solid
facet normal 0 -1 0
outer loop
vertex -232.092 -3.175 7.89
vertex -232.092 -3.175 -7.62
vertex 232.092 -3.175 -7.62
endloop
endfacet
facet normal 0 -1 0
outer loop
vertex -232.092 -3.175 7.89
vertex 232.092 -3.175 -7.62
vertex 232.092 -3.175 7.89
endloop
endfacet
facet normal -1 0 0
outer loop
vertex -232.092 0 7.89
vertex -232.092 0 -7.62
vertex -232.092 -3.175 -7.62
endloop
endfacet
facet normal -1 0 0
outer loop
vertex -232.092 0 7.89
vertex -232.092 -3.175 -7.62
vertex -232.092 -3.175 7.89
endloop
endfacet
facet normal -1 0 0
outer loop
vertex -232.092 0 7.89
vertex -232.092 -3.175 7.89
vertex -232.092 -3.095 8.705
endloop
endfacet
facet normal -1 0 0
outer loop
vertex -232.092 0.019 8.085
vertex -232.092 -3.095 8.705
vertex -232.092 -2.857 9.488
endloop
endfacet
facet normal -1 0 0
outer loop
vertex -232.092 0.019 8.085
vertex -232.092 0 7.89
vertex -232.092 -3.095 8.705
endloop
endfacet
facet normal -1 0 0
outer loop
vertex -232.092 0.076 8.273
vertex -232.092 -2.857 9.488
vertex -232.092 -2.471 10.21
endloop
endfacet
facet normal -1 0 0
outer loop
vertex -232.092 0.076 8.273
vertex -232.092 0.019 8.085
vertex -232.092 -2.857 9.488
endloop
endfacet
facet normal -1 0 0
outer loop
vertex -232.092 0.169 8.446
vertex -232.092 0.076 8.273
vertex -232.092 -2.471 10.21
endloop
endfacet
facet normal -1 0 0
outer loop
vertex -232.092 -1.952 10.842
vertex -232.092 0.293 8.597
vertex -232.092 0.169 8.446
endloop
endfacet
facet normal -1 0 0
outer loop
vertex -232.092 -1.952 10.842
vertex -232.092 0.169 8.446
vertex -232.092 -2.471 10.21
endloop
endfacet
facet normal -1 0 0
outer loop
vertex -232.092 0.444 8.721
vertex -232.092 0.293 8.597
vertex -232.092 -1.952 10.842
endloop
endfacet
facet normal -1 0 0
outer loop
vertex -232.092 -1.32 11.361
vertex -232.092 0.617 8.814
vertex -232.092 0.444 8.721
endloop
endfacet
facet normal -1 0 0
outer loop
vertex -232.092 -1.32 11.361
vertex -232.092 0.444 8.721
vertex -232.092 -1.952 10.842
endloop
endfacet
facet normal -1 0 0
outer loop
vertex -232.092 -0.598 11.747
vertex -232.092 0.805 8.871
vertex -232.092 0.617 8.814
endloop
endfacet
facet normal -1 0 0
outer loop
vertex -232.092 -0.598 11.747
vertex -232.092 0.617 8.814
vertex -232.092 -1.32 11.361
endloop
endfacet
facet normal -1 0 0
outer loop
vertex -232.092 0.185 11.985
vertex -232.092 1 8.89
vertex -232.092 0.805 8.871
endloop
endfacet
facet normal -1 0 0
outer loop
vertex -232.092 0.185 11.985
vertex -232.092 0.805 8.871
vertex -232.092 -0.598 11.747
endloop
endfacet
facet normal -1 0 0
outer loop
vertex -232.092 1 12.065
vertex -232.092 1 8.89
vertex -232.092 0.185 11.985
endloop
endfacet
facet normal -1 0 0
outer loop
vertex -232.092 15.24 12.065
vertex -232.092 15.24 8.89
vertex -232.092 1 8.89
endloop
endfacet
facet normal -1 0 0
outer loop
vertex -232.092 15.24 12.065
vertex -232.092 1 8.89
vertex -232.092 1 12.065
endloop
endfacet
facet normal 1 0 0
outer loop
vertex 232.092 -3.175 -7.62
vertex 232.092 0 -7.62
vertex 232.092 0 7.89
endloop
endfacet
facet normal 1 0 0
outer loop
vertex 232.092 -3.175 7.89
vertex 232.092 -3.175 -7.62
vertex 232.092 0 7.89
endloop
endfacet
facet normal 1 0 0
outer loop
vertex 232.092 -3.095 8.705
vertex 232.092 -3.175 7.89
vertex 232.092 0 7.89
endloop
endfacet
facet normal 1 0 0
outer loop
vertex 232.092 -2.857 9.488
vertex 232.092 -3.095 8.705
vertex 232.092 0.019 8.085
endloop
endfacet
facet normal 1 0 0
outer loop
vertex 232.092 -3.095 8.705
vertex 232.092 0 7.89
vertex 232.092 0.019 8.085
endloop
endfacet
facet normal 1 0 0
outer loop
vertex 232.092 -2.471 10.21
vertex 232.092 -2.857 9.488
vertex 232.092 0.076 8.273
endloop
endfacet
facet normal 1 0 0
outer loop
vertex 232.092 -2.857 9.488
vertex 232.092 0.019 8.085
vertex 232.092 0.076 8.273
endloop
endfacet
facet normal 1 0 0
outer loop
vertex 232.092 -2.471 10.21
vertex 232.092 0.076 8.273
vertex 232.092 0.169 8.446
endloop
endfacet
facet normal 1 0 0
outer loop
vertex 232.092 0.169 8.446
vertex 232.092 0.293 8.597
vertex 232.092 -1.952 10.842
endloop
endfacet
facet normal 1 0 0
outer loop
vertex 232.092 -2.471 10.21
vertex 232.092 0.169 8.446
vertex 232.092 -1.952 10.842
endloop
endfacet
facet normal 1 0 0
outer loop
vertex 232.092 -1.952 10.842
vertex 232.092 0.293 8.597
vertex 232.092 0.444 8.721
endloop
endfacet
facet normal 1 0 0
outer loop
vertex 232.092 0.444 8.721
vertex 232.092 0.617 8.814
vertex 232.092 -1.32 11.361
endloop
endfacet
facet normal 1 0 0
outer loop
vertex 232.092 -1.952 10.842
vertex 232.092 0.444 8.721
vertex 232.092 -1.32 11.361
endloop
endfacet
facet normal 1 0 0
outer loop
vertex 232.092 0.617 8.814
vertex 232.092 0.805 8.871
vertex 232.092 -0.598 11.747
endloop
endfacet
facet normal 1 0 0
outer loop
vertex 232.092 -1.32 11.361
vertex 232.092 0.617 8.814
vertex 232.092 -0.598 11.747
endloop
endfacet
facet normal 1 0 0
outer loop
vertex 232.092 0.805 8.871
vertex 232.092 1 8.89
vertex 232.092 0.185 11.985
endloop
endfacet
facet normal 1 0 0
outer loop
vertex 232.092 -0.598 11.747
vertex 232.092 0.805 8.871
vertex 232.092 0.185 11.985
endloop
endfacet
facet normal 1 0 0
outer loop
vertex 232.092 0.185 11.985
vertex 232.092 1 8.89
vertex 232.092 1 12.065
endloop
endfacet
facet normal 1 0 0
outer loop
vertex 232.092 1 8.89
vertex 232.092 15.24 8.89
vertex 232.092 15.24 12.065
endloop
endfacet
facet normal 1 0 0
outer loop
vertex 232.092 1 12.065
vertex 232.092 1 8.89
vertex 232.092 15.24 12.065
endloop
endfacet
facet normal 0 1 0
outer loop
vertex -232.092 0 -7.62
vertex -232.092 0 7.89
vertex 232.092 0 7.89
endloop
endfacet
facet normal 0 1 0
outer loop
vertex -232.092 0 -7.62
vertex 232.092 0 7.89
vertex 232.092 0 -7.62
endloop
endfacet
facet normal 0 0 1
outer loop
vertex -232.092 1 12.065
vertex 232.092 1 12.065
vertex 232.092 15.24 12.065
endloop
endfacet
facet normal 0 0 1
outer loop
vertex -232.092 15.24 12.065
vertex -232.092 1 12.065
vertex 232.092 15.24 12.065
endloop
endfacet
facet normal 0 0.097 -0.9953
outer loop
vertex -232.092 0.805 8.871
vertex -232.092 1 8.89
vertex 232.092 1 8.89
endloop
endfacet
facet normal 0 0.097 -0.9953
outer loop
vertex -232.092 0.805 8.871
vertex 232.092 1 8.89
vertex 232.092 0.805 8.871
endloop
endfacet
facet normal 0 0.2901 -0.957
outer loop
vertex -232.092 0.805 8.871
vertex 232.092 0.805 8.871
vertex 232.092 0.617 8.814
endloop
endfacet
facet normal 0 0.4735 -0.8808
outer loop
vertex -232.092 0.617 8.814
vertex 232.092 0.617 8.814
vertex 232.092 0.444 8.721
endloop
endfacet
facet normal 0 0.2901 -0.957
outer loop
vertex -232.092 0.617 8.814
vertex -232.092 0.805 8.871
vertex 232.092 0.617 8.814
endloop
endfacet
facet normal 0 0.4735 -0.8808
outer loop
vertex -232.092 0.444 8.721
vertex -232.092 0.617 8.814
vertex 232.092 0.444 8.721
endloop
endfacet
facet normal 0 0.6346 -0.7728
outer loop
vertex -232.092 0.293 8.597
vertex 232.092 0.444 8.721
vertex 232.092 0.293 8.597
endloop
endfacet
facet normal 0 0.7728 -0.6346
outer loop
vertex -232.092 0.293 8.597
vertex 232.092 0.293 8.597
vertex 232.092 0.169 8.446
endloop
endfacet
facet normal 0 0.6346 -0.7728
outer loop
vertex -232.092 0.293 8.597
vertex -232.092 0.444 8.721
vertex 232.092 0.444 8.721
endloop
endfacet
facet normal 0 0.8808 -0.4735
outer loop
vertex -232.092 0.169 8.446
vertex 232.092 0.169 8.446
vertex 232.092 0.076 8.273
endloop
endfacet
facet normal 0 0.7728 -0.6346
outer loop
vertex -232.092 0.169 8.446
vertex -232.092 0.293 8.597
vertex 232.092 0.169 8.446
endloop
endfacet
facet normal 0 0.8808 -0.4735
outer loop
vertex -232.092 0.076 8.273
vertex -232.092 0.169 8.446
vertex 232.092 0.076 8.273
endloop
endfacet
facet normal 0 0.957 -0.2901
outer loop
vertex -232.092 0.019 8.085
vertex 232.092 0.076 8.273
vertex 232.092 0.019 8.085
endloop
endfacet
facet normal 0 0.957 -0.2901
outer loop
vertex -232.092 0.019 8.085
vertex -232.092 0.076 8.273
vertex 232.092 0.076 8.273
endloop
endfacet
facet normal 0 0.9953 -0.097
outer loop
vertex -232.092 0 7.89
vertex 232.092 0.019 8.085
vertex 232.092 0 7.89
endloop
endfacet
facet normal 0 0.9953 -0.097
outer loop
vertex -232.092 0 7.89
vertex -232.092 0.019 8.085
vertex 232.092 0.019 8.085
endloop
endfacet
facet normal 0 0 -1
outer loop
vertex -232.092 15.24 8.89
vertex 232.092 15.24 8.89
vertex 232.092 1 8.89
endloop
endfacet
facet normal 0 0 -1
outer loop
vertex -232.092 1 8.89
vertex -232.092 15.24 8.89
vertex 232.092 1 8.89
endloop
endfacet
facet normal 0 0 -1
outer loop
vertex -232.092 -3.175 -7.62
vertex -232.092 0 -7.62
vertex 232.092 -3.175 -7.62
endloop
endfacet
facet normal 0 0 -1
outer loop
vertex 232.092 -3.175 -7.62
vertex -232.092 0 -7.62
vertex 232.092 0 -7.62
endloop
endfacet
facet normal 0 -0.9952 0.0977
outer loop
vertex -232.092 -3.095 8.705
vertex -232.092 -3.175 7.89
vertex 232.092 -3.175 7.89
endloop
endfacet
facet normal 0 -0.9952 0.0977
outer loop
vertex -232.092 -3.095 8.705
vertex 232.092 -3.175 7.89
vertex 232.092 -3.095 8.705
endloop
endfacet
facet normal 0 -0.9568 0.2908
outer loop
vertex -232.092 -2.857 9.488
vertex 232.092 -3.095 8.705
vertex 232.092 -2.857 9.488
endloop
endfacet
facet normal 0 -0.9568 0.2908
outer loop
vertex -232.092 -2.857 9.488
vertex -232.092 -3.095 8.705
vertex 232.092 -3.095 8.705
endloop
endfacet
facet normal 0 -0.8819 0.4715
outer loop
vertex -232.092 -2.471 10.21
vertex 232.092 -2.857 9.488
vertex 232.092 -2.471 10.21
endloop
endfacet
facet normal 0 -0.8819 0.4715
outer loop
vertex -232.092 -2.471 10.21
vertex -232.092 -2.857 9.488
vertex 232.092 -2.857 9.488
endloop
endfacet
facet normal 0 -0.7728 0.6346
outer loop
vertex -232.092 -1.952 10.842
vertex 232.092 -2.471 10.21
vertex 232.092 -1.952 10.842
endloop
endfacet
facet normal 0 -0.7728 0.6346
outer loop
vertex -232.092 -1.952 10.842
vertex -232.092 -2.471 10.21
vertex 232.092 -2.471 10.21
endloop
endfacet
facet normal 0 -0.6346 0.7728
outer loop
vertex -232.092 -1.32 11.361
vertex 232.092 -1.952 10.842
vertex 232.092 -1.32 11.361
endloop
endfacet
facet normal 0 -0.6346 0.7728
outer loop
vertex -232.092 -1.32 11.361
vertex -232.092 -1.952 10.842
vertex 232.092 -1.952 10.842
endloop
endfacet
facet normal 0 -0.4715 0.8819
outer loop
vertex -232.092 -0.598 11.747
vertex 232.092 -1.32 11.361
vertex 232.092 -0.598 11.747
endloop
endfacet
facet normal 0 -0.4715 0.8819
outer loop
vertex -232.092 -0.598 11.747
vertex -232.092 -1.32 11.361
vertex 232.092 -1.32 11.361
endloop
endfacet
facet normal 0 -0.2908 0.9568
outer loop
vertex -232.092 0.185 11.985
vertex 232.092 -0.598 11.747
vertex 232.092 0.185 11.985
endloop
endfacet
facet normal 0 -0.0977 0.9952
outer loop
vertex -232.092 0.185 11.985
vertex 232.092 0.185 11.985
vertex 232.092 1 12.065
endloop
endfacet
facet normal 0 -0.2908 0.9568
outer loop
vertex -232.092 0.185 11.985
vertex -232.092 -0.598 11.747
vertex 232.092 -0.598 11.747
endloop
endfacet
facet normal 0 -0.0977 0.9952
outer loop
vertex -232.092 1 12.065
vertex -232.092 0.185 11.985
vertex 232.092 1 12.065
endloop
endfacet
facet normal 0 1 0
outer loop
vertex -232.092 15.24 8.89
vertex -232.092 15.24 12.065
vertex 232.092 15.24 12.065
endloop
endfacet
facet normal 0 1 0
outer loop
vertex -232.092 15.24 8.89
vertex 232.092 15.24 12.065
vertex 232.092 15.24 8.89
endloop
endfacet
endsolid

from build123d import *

# Parameters (mm, degrees)
SKETCH1_W          = 464.185
SKETCH1_H          = 15.24
BASE_FLANGE1_DEPTH = 3.175
EDGE_FLANGE1_DEPTH = 464.185


# Sheet-metal steps are written as plain solids
with BuildPart() as part:
    # Sketch1 → Base-Flange1 (new body)
    with BuildSketch(Plane(origin=(0, 0, 0), x_dir=(1, 0, 0), z_dir=(0, 1, 0))):
        Rectangle(SKETCH1_W, SKETCH1_H)
    extrude(amount=-BASE_FLANGE1_DEPTH)

    # Edge-Flange1 section (across the edge) → Edge-Flange1 (add)
    with BuildSketch(Plane(origin=(-232.0925, 0, 8.89), x_dir=(0, 0, -1), z_dir=(1, 0, 0))):
        with BuildLine():
            Line((-3.175, 1), (-3.175, 15.24))
            Line((-3.175, 15.24), (0, 15.24))
            Line((0, 15.24), (0, 1))
            ThreePointArc((0, 1), (0.292893219, 0.292893219), (1, 0))
            Line((1, 0), (1.27, 0))
            Line((1.27, 0), (1.27, -3.175))
            Line((1.27, -3.175), (1, -3.175))
            ThreePointArc((1, -3.175), (-1.952170811, -1.952170811), (-3.175, 1))
        make_face()
    extrude(amount=EDGE_FLANGE1_DEPTH)


solid = part.part
